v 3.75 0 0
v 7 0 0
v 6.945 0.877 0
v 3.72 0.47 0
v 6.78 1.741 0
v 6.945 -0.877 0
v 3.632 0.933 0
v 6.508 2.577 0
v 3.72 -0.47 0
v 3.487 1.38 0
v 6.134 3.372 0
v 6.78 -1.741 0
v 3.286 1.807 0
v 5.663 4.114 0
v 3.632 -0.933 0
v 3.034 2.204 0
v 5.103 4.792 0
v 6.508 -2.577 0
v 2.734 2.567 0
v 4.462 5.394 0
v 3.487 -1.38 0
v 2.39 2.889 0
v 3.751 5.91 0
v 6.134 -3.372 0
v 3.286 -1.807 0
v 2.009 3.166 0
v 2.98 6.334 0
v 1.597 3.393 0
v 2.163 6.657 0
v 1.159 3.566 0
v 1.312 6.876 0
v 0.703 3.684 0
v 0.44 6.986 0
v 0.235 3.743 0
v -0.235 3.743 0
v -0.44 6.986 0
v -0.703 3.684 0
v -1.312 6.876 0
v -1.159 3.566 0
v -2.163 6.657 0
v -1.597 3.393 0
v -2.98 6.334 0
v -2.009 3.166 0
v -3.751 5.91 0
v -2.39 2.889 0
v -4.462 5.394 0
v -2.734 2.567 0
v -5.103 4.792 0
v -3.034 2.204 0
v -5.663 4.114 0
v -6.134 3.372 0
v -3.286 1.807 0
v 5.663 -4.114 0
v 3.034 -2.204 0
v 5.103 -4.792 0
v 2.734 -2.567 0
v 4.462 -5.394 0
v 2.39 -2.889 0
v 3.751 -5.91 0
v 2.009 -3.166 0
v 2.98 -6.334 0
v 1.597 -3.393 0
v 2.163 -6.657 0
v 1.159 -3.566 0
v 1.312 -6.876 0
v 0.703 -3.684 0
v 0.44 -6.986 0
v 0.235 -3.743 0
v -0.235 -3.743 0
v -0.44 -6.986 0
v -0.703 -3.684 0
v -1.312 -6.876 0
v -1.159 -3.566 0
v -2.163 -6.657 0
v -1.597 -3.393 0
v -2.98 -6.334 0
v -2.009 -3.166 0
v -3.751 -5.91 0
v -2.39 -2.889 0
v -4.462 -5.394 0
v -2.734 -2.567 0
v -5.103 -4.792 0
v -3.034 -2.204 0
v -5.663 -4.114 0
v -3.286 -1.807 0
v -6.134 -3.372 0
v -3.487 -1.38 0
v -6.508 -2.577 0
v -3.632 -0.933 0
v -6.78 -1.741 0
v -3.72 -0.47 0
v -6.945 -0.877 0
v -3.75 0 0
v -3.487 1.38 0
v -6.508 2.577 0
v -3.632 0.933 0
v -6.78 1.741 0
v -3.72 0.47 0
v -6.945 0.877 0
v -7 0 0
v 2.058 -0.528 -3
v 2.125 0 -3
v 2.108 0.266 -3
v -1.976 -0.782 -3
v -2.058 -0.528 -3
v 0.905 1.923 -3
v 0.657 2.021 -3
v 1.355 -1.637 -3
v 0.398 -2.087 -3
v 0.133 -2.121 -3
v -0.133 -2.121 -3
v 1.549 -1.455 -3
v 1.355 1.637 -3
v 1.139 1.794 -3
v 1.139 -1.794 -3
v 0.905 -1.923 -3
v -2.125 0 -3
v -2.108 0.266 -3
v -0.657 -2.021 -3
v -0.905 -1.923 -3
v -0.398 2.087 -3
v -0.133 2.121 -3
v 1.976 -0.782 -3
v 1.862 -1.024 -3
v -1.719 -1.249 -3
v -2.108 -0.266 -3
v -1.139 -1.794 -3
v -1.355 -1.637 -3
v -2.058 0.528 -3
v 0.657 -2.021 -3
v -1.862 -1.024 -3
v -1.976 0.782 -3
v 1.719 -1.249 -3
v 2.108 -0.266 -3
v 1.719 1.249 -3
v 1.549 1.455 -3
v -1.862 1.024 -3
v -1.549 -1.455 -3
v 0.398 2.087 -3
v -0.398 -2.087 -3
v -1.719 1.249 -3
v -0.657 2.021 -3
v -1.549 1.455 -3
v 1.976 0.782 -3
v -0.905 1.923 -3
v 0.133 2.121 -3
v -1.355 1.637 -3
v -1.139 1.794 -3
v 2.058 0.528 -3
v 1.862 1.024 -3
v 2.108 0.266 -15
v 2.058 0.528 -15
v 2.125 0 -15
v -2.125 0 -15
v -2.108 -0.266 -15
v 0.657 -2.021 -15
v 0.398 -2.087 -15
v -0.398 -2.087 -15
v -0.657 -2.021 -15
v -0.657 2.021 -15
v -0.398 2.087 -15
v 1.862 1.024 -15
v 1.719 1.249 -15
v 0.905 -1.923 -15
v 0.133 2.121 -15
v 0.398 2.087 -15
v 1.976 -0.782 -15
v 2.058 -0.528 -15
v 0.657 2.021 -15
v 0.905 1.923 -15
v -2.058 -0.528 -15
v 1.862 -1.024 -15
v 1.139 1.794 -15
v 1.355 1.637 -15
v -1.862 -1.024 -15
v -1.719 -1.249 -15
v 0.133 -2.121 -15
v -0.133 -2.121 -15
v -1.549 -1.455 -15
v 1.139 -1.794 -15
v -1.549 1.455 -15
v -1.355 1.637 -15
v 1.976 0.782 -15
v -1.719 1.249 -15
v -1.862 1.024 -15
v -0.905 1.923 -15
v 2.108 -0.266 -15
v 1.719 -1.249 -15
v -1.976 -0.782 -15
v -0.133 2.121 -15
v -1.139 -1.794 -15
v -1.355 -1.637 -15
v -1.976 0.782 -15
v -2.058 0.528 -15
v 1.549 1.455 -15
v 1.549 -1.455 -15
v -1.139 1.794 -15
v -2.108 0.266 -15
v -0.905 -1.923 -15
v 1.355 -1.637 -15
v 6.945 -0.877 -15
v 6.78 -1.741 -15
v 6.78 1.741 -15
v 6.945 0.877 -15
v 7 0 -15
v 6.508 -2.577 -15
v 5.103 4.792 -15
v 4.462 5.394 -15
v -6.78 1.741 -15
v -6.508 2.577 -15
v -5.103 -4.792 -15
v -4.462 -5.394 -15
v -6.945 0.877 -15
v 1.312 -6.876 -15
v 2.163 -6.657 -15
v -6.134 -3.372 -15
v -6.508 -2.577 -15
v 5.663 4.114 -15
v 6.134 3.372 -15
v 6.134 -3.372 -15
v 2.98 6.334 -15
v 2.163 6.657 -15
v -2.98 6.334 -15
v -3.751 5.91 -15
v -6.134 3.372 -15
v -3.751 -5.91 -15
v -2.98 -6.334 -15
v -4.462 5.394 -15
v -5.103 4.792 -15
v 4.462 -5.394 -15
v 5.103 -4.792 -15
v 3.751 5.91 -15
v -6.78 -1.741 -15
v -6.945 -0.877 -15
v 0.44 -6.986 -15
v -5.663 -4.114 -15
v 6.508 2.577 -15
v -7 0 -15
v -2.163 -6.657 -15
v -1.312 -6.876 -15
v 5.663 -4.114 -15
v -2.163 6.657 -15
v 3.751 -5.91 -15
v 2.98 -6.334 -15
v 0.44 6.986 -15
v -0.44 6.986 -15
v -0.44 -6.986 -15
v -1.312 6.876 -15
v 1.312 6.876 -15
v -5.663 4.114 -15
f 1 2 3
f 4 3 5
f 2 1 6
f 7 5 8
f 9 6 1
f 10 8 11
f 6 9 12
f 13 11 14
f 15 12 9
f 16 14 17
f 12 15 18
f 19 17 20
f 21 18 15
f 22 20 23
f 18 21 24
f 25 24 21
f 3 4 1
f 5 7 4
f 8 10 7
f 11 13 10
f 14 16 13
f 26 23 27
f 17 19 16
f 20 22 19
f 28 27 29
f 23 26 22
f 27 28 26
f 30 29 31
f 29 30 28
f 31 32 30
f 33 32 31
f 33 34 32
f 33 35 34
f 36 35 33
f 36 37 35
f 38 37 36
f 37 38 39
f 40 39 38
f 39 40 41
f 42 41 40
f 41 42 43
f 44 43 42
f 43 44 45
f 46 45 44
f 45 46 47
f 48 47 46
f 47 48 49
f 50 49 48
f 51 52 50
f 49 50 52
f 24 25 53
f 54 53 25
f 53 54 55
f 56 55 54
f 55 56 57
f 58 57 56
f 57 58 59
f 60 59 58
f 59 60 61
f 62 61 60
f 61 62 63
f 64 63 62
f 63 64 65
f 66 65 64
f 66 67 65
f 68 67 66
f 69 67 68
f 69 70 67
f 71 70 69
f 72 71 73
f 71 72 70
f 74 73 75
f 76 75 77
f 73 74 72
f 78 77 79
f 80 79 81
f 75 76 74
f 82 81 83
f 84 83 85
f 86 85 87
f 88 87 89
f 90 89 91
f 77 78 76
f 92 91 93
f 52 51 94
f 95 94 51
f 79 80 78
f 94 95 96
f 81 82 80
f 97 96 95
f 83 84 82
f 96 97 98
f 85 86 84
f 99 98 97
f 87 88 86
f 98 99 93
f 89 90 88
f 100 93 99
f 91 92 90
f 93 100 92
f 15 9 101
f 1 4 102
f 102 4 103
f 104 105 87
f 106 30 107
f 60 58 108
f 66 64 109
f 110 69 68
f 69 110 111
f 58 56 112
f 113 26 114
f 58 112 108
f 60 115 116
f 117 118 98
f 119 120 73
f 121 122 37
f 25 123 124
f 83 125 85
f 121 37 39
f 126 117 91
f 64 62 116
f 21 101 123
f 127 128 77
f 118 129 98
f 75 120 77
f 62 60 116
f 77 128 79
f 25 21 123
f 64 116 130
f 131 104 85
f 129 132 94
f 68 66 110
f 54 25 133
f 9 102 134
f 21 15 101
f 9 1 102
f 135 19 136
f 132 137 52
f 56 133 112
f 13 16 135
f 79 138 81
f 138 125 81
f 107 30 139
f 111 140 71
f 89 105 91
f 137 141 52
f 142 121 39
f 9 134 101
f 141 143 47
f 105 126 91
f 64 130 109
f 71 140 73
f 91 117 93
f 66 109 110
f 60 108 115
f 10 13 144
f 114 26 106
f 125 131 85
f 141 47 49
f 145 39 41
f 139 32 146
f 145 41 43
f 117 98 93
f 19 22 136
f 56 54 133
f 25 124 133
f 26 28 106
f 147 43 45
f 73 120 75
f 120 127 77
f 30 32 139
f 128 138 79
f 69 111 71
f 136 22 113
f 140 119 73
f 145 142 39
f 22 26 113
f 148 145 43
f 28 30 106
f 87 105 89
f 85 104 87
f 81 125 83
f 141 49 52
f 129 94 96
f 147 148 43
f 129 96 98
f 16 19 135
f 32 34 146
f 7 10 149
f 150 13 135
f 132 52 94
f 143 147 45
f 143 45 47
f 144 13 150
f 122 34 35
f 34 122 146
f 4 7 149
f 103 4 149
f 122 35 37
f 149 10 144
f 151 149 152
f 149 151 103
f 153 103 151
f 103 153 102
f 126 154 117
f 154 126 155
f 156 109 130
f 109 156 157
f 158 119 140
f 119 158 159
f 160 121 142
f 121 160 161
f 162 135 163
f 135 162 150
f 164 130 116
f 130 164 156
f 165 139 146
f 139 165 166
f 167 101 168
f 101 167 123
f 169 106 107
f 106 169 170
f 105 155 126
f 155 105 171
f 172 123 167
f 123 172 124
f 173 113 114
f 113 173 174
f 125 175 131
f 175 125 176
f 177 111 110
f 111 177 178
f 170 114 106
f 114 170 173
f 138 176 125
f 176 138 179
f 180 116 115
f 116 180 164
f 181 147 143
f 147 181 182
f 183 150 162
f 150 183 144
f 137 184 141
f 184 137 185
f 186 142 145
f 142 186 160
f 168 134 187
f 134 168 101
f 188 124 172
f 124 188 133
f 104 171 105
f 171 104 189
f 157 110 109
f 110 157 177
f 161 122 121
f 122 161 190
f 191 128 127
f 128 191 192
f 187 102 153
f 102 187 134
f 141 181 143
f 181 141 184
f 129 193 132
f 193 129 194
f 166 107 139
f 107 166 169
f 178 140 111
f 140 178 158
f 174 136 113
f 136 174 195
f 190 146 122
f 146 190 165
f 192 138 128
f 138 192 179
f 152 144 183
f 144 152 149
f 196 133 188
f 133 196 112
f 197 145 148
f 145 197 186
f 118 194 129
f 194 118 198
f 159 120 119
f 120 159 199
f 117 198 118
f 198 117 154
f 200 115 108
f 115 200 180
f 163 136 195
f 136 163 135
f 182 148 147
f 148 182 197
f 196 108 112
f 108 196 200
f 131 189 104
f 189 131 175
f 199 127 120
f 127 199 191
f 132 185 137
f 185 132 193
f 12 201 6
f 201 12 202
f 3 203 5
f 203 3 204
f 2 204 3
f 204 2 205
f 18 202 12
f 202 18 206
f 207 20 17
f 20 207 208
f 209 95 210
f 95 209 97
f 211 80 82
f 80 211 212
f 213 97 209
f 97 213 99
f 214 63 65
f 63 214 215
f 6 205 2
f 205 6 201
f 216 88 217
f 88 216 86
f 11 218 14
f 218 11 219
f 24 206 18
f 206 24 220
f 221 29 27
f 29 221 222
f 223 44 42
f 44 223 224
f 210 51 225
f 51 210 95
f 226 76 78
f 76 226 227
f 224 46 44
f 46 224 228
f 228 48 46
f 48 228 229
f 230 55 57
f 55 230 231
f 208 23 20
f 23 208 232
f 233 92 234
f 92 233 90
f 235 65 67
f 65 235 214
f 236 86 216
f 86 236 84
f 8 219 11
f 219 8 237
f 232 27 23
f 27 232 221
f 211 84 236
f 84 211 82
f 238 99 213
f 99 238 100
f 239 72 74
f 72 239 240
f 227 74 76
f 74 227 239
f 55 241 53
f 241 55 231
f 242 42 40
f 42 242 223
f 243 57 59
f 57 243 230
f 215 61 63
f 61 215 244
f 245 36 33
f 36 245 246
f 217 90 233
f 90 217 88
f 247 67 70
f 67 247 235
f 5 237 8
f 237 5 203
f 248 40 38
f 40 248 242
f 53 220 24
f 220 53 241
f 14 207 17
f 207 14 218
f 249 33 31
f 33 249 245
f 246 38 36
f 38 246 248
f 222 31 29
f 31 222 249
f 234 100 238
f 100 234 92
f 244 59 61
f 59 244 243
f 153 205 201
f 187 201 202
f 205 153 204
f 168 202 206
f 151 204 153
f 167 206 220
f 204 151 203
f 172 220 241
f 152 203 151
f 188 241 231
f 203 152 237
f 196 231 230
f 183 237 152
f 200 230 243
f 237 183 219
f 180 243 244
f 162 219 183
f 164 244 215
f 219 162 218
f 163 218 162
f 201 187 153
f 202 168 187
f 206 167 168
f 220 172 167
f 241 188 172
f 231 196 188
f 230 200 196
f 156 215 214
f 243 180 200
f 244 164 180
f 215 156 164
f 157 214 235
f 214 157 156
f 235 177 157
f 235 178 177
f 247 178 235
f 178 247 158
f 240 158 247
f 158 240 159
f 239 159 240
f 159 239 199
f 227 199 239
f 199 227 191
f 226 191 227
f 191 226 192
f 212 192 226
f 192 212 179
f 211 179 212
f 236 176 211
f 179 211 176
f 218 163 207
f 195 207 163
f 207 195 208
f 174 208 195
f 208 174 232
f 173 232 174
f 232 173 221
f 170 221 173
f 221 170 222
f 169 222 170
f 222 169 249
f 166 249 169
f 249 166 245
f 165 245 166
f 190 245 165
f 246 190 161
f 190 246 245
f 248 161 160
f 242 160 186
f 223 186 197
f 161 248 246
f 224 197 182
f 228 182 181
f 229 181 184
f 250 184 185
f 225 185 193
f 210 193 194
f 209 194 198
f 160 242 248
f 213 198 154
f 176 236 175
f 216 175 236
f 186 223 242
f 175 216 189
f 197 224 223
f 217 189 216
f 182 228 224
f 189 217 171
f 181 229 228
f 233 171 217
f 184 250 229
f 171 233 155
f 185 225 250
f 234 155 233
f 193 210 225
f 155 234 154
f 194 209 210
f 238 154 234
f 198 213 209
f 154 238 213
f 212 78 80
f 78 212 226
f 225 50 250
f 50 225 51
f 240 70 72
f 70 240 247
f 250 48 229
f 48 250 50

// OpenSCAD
$fn = 50;

difference() {
	union() {
		translate(v = [0, 0, -15.0]) {
			cylinder(h = 15, r = 7.0);
		}
	}
	union() {
		translate(v = [0, 0, 0]) {
			rotate(a = [0, 0, 0]) {
				difference() {
					union() {
						translate(v = [0, 0, -18.0]) {
							cylinder(h = 18, r = 2.0);
						}
						translate(v = [0, 0, -3]) {
							cylinder(h = 3, r1 = 2.125, r2 = 3.75);
						}
						translate(v = [0, 0, -18.0]) {
							cylinder(h = 18, r = 2.125);
						}
						translate(v = [0, 0, -18.0]) {
							cylinder(h = 18, r = 2.0);
						}
					}
					union();
				}
			}
		}
	}
}
